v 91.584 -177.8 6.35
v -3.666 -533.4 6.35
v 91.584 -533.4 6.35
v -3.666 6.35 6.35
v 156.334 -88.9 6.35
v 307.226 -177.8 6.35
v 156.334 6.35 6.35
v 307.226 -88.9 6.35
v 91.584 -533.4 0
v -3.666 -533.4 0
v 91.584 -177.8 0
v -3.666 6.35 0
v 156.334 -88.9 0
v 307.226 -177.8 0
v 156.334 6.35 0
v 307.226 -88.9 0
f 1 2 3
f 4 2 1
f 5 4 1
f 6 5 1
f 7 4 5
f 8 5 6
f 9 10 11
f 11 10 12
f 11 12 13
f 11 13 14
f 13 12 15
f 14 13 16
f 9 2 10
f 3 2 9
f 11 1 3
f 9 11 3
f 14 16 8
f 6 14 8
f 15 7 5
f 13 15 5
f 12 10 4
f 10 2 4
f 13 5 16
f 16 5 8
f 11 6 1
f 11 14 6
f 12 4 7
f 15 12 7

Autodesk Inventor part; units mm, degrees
ref_plane "YZ Plane" through (0, 0, 0) normal (1, 0, 0) x (0, 1, 0)
ref_plane "XZ Plane" through (0, 0, 0) normal (0, 1, 0) x (-1, 0, 0)
ref_plane "XY Plane" through (0, 0, 0) normal (0, 0, 1) x (1, 0, 0)
sketch "Sketch1" plane through (0, 0, 0) normal (0, 0, 1) x (1, 0, 0)
  line L0 (0, 0) -> (307.2255, 0)
  line L1 (307.2255, 0) -> (307.2255, -177.8)
  line L2 (307.2255, -177.8) -> (0, -177.8)
  line L3 (0, -177.8) -> (0, 0)
  line L4 (460.8382, 266.0651) -> (307.2255, 0)
  line L5 (307.2255, 0) -> (0, 0)
  line L6 (0, 0) -> (-153.6127, 266.0651)
  line L7 (-153.6127, 266.0651) -> (0, 532.1302)
  line L8 (0, 532.1302) -> (307.2255, 532.1302)
  line L9 (307.2255, 532.1302) -> (460.8382, 266.0651)
  point P0 (153.6127, 266.0651)
  dimension "d1" = 177.8
  dimension "d39" = 307.2255
extrude "Extrusion1" add sketch "Sketch1" along normal blind 6.35 contours L0 L1 L2 L3
sketch "Sketch2" plane through (0, 0, 0) normal (0, 1, 0) x (1, 0, 0)
  line L0 (307.2255, -6.35) -> (0, -6.35) projected
  line L1 (0, -6.35) -> (-3.6662, -6.35)
  line L2 (-3.6662, -6.35) -> (0, 0)
  line L3 (0, 0) -> (0, -6.35) projected
  line L4 (0, 0) -> (0, -6.35) projected
  line L5 (0, -6.35) -> (0, 0)
  line L6 (307.2255, -6.35) -> (310.8917, -6.35)
  line L7 (307.2255, 0) -> (307.2255, -6.35) projected
  line L8 (310.8917, -6.35) -> (307.2255, 0)
  line L9 (307.2255, 0) -> (307.2255, -6.35)
  dimension "d4" = 30
  dimension "d5" = 60
extrude "Extrusion2" add sketch "Sketch2" against normal blind 177.8
sketch "Sketch3" plane through (0, 0, 6.35) normal (0, 0, 1) x (1, 0, 0)
  line L0 (81.3338, -88.9) -> (281.3338, -88.9)
  line L1 (281.3338, -88.9) -> (281.3338, 0)
  line L2 (281.3338, 0) -> (81.3338, 0)
  line L3 (81.3338, 0) -> (81.3338, -88.9)
  line L4 (-3.6662, 0) -> (310.8917, 0) projected
  line L5 (81.3338, -88.9) -> (192.81, -88.9)
  line L6 (121.05, 0) -> (81.3338, 0)
  line L7 (81.3338, 0) -> (81.3338, -88.9)
  line L8 (281.3338, 0) -> (169.304, 0)
  line L9 (156.3338, -88.9) -> (281.3338, -88.9)
  line L10 (281.3338, -88.9) -> (281.3338, 0)
  line L11 (81.3338, 0) -> (156.3338, 0)
  line L12 (156.3338, 0) -> (156.3338, -88.9)
  line L13 (156.3338, -88.9) -> (81.3338, -88.9)
  line L14 (81.3338, -88.9) -> (81.3338, 0)
  line L15 (281.3338, 0) -> (281.3338, -88.9)
  line L16 (281.3338, -88.9) -> (281.3338, 0)
  line L17 (-3.6662, 0) -> (-3.6662, -177.8) projected
  point P0 (0, 0)
  point P1 (281.3338, -44.45)
  point P2 (153.6127, 0)
  point P3 (153.6127, 0)
  dimension "d8" = 200
  dimension "d9" = 88.9
  dimension "d14" = 75
  dimension "d33" = 85
extrude "Extrusion3" cut sketch "Sketch3" against normal through all contours L12 L2 L1 L0
sketch "Sketch5" plane through (0, 0, 6.35) normal (0, 0, 1) x (1, 0, 0)
  line L0 (310.8917, -177.8) -> (-3.6662, -177.8) projected
  line L1 (-3.6662, -177.8) -> (91.5838, -177.8)
  line L2 (91.5838, -177.8) -> (91.5838, -533.4)
  line L3 (91.5838, -533.4) -> (-3.6662, -533.4)
  line L4 (-3.6662, -533.4) -> (-3.6662, -177.8)
  point P0 (0, 0)
  dimension "d23" = 95.25
  dimension "d24" = 355.6
extrude "Extrusion5" add sketch "Sketch5" against normal blind 10
sketch "Sketch6" plane through (-3.6662, -177.8, -3.65) normal (0, 1, 0) x (1, 0, 0)
  line L0 (0, -10) -> (3.6662, -3.65) projected
  line L1 (0, 0) -> (95.25, 0) projected
  line L2 (0, -10) -> (0, 0) projected
  line L3 (95.25, -3.65) -> (3.6662, -3.65) projected
  line L4 (95.25, -3.65) -> (95.25, 0) projected
  point P0 (3.6662, -3.65)
extrude "Extrusion6" cut sketch "Sketch6" against normal through all
sketch "Sketch9" plane through (0, 0, 6.35) normal (0, 0, 1) x (1, 0, 0)
  line L0 (281.3338, -88.9) -> (156.3338, -88.9) projected
  line L1 (310.8917, 0) -> (310.8917, -177.8) projected
  line L2 (281.3338, -88.9) -> (310.8917, -88.9)
  line L3 (310.8917, -88.9) -> (310.8917, 0)
  line L4 (310.8917, 0) -> (281.3338, 0)
  line L5 (281.3338, 0) -> (281.3338, -88.9)
  point P0 (0, 0)
extrude "Extrusion8" cut sketch "Sketch9" against normal through all
sketch "Sketch10" plane through (0, 0, 0) normal (0, 1, 0) x (1, 0, 0)
  line L0 (0, 0) -> (0, -6.35)
  line L1 (-3.6662, -6.35) -> (156.3338, -6.35) projected
  line L2 (0, -6.35) -> (-3.6662, -6.35)
  line L3 (0, 0) -> (-3.6662, -6.35) projected
  line L4 (0, 0) -> (-3.6662, -6.35)
  line L5 (0, 0) -> (156.3338, 0) projected
  line L6 (-3.6662, -6.35) -> (0, 0)
  line L7 (156.3338, 0) -> (307.2255, 0) projected
  line L8 (307.2255, 0) -> (307.2255, -6.35)
  line L9 (310.8917, -6.35) -> (156.3338, -6.35) projected
  line L10 (307.2255, -6.35) -> (310.8917, -6.35)
  line L11 (307.2255, 0) -> (310.8917, -6.35) projected
  line L12 (310.8917, -6.35) -> (307.2255, 0)
  line L13 (307.2255, 0) -> (310.8917, -6.35)
extrude "Extrusion9" cut sketch "Sketch10" against normal through all contours L0 L1 L3 | L11 L9 L8
sketch "Sketch11" plane through (0, 0, 6.35) normal (0, 0, 1) x (1, 0, 0)
  line L0 (0, 0) -> (-3.6662, 0)
  line L1 (-3.6662, 0) -> (-3.6662, -533.4)
  line L2 (-3.6662, -533.4) -> (0, -533.4)
  line L3 (0, -533.4) -> (0, 0)
  line L4 (91.5838, -177.8) -> (91.5838, -533.4) projected
  dimension "d40" = 95.25
extrude "Extrusion10" add sketch "Sketch11" against normal blind 6.35
sketch "Sketch12" plane through (0, 0, 6.35) normal (0, 0, 1) x (1, 0, 0)
  line L0 (-3.6662, 0) -> (156.3338, 0) projected
  line L1 (156.3338, 0) -> (-3.6662, 0)
  line L2 (-3.6662, 0) -> (-3.6662, 6.35)
  line L3 (-3.6662, 6.35) -> (156.3338, 6.35)
  line L4 (156.3338, 6.35) -> (156.3338, 0)
  point P0 (0, 0)
  point P1 (-3.6662, 3.175)
  dimension "d43" = 6.35
extrude "Extrusion11" add sketch "Sketch12" against normal blind 6.35
properties part number "BA03" material "ABS Plastic"
